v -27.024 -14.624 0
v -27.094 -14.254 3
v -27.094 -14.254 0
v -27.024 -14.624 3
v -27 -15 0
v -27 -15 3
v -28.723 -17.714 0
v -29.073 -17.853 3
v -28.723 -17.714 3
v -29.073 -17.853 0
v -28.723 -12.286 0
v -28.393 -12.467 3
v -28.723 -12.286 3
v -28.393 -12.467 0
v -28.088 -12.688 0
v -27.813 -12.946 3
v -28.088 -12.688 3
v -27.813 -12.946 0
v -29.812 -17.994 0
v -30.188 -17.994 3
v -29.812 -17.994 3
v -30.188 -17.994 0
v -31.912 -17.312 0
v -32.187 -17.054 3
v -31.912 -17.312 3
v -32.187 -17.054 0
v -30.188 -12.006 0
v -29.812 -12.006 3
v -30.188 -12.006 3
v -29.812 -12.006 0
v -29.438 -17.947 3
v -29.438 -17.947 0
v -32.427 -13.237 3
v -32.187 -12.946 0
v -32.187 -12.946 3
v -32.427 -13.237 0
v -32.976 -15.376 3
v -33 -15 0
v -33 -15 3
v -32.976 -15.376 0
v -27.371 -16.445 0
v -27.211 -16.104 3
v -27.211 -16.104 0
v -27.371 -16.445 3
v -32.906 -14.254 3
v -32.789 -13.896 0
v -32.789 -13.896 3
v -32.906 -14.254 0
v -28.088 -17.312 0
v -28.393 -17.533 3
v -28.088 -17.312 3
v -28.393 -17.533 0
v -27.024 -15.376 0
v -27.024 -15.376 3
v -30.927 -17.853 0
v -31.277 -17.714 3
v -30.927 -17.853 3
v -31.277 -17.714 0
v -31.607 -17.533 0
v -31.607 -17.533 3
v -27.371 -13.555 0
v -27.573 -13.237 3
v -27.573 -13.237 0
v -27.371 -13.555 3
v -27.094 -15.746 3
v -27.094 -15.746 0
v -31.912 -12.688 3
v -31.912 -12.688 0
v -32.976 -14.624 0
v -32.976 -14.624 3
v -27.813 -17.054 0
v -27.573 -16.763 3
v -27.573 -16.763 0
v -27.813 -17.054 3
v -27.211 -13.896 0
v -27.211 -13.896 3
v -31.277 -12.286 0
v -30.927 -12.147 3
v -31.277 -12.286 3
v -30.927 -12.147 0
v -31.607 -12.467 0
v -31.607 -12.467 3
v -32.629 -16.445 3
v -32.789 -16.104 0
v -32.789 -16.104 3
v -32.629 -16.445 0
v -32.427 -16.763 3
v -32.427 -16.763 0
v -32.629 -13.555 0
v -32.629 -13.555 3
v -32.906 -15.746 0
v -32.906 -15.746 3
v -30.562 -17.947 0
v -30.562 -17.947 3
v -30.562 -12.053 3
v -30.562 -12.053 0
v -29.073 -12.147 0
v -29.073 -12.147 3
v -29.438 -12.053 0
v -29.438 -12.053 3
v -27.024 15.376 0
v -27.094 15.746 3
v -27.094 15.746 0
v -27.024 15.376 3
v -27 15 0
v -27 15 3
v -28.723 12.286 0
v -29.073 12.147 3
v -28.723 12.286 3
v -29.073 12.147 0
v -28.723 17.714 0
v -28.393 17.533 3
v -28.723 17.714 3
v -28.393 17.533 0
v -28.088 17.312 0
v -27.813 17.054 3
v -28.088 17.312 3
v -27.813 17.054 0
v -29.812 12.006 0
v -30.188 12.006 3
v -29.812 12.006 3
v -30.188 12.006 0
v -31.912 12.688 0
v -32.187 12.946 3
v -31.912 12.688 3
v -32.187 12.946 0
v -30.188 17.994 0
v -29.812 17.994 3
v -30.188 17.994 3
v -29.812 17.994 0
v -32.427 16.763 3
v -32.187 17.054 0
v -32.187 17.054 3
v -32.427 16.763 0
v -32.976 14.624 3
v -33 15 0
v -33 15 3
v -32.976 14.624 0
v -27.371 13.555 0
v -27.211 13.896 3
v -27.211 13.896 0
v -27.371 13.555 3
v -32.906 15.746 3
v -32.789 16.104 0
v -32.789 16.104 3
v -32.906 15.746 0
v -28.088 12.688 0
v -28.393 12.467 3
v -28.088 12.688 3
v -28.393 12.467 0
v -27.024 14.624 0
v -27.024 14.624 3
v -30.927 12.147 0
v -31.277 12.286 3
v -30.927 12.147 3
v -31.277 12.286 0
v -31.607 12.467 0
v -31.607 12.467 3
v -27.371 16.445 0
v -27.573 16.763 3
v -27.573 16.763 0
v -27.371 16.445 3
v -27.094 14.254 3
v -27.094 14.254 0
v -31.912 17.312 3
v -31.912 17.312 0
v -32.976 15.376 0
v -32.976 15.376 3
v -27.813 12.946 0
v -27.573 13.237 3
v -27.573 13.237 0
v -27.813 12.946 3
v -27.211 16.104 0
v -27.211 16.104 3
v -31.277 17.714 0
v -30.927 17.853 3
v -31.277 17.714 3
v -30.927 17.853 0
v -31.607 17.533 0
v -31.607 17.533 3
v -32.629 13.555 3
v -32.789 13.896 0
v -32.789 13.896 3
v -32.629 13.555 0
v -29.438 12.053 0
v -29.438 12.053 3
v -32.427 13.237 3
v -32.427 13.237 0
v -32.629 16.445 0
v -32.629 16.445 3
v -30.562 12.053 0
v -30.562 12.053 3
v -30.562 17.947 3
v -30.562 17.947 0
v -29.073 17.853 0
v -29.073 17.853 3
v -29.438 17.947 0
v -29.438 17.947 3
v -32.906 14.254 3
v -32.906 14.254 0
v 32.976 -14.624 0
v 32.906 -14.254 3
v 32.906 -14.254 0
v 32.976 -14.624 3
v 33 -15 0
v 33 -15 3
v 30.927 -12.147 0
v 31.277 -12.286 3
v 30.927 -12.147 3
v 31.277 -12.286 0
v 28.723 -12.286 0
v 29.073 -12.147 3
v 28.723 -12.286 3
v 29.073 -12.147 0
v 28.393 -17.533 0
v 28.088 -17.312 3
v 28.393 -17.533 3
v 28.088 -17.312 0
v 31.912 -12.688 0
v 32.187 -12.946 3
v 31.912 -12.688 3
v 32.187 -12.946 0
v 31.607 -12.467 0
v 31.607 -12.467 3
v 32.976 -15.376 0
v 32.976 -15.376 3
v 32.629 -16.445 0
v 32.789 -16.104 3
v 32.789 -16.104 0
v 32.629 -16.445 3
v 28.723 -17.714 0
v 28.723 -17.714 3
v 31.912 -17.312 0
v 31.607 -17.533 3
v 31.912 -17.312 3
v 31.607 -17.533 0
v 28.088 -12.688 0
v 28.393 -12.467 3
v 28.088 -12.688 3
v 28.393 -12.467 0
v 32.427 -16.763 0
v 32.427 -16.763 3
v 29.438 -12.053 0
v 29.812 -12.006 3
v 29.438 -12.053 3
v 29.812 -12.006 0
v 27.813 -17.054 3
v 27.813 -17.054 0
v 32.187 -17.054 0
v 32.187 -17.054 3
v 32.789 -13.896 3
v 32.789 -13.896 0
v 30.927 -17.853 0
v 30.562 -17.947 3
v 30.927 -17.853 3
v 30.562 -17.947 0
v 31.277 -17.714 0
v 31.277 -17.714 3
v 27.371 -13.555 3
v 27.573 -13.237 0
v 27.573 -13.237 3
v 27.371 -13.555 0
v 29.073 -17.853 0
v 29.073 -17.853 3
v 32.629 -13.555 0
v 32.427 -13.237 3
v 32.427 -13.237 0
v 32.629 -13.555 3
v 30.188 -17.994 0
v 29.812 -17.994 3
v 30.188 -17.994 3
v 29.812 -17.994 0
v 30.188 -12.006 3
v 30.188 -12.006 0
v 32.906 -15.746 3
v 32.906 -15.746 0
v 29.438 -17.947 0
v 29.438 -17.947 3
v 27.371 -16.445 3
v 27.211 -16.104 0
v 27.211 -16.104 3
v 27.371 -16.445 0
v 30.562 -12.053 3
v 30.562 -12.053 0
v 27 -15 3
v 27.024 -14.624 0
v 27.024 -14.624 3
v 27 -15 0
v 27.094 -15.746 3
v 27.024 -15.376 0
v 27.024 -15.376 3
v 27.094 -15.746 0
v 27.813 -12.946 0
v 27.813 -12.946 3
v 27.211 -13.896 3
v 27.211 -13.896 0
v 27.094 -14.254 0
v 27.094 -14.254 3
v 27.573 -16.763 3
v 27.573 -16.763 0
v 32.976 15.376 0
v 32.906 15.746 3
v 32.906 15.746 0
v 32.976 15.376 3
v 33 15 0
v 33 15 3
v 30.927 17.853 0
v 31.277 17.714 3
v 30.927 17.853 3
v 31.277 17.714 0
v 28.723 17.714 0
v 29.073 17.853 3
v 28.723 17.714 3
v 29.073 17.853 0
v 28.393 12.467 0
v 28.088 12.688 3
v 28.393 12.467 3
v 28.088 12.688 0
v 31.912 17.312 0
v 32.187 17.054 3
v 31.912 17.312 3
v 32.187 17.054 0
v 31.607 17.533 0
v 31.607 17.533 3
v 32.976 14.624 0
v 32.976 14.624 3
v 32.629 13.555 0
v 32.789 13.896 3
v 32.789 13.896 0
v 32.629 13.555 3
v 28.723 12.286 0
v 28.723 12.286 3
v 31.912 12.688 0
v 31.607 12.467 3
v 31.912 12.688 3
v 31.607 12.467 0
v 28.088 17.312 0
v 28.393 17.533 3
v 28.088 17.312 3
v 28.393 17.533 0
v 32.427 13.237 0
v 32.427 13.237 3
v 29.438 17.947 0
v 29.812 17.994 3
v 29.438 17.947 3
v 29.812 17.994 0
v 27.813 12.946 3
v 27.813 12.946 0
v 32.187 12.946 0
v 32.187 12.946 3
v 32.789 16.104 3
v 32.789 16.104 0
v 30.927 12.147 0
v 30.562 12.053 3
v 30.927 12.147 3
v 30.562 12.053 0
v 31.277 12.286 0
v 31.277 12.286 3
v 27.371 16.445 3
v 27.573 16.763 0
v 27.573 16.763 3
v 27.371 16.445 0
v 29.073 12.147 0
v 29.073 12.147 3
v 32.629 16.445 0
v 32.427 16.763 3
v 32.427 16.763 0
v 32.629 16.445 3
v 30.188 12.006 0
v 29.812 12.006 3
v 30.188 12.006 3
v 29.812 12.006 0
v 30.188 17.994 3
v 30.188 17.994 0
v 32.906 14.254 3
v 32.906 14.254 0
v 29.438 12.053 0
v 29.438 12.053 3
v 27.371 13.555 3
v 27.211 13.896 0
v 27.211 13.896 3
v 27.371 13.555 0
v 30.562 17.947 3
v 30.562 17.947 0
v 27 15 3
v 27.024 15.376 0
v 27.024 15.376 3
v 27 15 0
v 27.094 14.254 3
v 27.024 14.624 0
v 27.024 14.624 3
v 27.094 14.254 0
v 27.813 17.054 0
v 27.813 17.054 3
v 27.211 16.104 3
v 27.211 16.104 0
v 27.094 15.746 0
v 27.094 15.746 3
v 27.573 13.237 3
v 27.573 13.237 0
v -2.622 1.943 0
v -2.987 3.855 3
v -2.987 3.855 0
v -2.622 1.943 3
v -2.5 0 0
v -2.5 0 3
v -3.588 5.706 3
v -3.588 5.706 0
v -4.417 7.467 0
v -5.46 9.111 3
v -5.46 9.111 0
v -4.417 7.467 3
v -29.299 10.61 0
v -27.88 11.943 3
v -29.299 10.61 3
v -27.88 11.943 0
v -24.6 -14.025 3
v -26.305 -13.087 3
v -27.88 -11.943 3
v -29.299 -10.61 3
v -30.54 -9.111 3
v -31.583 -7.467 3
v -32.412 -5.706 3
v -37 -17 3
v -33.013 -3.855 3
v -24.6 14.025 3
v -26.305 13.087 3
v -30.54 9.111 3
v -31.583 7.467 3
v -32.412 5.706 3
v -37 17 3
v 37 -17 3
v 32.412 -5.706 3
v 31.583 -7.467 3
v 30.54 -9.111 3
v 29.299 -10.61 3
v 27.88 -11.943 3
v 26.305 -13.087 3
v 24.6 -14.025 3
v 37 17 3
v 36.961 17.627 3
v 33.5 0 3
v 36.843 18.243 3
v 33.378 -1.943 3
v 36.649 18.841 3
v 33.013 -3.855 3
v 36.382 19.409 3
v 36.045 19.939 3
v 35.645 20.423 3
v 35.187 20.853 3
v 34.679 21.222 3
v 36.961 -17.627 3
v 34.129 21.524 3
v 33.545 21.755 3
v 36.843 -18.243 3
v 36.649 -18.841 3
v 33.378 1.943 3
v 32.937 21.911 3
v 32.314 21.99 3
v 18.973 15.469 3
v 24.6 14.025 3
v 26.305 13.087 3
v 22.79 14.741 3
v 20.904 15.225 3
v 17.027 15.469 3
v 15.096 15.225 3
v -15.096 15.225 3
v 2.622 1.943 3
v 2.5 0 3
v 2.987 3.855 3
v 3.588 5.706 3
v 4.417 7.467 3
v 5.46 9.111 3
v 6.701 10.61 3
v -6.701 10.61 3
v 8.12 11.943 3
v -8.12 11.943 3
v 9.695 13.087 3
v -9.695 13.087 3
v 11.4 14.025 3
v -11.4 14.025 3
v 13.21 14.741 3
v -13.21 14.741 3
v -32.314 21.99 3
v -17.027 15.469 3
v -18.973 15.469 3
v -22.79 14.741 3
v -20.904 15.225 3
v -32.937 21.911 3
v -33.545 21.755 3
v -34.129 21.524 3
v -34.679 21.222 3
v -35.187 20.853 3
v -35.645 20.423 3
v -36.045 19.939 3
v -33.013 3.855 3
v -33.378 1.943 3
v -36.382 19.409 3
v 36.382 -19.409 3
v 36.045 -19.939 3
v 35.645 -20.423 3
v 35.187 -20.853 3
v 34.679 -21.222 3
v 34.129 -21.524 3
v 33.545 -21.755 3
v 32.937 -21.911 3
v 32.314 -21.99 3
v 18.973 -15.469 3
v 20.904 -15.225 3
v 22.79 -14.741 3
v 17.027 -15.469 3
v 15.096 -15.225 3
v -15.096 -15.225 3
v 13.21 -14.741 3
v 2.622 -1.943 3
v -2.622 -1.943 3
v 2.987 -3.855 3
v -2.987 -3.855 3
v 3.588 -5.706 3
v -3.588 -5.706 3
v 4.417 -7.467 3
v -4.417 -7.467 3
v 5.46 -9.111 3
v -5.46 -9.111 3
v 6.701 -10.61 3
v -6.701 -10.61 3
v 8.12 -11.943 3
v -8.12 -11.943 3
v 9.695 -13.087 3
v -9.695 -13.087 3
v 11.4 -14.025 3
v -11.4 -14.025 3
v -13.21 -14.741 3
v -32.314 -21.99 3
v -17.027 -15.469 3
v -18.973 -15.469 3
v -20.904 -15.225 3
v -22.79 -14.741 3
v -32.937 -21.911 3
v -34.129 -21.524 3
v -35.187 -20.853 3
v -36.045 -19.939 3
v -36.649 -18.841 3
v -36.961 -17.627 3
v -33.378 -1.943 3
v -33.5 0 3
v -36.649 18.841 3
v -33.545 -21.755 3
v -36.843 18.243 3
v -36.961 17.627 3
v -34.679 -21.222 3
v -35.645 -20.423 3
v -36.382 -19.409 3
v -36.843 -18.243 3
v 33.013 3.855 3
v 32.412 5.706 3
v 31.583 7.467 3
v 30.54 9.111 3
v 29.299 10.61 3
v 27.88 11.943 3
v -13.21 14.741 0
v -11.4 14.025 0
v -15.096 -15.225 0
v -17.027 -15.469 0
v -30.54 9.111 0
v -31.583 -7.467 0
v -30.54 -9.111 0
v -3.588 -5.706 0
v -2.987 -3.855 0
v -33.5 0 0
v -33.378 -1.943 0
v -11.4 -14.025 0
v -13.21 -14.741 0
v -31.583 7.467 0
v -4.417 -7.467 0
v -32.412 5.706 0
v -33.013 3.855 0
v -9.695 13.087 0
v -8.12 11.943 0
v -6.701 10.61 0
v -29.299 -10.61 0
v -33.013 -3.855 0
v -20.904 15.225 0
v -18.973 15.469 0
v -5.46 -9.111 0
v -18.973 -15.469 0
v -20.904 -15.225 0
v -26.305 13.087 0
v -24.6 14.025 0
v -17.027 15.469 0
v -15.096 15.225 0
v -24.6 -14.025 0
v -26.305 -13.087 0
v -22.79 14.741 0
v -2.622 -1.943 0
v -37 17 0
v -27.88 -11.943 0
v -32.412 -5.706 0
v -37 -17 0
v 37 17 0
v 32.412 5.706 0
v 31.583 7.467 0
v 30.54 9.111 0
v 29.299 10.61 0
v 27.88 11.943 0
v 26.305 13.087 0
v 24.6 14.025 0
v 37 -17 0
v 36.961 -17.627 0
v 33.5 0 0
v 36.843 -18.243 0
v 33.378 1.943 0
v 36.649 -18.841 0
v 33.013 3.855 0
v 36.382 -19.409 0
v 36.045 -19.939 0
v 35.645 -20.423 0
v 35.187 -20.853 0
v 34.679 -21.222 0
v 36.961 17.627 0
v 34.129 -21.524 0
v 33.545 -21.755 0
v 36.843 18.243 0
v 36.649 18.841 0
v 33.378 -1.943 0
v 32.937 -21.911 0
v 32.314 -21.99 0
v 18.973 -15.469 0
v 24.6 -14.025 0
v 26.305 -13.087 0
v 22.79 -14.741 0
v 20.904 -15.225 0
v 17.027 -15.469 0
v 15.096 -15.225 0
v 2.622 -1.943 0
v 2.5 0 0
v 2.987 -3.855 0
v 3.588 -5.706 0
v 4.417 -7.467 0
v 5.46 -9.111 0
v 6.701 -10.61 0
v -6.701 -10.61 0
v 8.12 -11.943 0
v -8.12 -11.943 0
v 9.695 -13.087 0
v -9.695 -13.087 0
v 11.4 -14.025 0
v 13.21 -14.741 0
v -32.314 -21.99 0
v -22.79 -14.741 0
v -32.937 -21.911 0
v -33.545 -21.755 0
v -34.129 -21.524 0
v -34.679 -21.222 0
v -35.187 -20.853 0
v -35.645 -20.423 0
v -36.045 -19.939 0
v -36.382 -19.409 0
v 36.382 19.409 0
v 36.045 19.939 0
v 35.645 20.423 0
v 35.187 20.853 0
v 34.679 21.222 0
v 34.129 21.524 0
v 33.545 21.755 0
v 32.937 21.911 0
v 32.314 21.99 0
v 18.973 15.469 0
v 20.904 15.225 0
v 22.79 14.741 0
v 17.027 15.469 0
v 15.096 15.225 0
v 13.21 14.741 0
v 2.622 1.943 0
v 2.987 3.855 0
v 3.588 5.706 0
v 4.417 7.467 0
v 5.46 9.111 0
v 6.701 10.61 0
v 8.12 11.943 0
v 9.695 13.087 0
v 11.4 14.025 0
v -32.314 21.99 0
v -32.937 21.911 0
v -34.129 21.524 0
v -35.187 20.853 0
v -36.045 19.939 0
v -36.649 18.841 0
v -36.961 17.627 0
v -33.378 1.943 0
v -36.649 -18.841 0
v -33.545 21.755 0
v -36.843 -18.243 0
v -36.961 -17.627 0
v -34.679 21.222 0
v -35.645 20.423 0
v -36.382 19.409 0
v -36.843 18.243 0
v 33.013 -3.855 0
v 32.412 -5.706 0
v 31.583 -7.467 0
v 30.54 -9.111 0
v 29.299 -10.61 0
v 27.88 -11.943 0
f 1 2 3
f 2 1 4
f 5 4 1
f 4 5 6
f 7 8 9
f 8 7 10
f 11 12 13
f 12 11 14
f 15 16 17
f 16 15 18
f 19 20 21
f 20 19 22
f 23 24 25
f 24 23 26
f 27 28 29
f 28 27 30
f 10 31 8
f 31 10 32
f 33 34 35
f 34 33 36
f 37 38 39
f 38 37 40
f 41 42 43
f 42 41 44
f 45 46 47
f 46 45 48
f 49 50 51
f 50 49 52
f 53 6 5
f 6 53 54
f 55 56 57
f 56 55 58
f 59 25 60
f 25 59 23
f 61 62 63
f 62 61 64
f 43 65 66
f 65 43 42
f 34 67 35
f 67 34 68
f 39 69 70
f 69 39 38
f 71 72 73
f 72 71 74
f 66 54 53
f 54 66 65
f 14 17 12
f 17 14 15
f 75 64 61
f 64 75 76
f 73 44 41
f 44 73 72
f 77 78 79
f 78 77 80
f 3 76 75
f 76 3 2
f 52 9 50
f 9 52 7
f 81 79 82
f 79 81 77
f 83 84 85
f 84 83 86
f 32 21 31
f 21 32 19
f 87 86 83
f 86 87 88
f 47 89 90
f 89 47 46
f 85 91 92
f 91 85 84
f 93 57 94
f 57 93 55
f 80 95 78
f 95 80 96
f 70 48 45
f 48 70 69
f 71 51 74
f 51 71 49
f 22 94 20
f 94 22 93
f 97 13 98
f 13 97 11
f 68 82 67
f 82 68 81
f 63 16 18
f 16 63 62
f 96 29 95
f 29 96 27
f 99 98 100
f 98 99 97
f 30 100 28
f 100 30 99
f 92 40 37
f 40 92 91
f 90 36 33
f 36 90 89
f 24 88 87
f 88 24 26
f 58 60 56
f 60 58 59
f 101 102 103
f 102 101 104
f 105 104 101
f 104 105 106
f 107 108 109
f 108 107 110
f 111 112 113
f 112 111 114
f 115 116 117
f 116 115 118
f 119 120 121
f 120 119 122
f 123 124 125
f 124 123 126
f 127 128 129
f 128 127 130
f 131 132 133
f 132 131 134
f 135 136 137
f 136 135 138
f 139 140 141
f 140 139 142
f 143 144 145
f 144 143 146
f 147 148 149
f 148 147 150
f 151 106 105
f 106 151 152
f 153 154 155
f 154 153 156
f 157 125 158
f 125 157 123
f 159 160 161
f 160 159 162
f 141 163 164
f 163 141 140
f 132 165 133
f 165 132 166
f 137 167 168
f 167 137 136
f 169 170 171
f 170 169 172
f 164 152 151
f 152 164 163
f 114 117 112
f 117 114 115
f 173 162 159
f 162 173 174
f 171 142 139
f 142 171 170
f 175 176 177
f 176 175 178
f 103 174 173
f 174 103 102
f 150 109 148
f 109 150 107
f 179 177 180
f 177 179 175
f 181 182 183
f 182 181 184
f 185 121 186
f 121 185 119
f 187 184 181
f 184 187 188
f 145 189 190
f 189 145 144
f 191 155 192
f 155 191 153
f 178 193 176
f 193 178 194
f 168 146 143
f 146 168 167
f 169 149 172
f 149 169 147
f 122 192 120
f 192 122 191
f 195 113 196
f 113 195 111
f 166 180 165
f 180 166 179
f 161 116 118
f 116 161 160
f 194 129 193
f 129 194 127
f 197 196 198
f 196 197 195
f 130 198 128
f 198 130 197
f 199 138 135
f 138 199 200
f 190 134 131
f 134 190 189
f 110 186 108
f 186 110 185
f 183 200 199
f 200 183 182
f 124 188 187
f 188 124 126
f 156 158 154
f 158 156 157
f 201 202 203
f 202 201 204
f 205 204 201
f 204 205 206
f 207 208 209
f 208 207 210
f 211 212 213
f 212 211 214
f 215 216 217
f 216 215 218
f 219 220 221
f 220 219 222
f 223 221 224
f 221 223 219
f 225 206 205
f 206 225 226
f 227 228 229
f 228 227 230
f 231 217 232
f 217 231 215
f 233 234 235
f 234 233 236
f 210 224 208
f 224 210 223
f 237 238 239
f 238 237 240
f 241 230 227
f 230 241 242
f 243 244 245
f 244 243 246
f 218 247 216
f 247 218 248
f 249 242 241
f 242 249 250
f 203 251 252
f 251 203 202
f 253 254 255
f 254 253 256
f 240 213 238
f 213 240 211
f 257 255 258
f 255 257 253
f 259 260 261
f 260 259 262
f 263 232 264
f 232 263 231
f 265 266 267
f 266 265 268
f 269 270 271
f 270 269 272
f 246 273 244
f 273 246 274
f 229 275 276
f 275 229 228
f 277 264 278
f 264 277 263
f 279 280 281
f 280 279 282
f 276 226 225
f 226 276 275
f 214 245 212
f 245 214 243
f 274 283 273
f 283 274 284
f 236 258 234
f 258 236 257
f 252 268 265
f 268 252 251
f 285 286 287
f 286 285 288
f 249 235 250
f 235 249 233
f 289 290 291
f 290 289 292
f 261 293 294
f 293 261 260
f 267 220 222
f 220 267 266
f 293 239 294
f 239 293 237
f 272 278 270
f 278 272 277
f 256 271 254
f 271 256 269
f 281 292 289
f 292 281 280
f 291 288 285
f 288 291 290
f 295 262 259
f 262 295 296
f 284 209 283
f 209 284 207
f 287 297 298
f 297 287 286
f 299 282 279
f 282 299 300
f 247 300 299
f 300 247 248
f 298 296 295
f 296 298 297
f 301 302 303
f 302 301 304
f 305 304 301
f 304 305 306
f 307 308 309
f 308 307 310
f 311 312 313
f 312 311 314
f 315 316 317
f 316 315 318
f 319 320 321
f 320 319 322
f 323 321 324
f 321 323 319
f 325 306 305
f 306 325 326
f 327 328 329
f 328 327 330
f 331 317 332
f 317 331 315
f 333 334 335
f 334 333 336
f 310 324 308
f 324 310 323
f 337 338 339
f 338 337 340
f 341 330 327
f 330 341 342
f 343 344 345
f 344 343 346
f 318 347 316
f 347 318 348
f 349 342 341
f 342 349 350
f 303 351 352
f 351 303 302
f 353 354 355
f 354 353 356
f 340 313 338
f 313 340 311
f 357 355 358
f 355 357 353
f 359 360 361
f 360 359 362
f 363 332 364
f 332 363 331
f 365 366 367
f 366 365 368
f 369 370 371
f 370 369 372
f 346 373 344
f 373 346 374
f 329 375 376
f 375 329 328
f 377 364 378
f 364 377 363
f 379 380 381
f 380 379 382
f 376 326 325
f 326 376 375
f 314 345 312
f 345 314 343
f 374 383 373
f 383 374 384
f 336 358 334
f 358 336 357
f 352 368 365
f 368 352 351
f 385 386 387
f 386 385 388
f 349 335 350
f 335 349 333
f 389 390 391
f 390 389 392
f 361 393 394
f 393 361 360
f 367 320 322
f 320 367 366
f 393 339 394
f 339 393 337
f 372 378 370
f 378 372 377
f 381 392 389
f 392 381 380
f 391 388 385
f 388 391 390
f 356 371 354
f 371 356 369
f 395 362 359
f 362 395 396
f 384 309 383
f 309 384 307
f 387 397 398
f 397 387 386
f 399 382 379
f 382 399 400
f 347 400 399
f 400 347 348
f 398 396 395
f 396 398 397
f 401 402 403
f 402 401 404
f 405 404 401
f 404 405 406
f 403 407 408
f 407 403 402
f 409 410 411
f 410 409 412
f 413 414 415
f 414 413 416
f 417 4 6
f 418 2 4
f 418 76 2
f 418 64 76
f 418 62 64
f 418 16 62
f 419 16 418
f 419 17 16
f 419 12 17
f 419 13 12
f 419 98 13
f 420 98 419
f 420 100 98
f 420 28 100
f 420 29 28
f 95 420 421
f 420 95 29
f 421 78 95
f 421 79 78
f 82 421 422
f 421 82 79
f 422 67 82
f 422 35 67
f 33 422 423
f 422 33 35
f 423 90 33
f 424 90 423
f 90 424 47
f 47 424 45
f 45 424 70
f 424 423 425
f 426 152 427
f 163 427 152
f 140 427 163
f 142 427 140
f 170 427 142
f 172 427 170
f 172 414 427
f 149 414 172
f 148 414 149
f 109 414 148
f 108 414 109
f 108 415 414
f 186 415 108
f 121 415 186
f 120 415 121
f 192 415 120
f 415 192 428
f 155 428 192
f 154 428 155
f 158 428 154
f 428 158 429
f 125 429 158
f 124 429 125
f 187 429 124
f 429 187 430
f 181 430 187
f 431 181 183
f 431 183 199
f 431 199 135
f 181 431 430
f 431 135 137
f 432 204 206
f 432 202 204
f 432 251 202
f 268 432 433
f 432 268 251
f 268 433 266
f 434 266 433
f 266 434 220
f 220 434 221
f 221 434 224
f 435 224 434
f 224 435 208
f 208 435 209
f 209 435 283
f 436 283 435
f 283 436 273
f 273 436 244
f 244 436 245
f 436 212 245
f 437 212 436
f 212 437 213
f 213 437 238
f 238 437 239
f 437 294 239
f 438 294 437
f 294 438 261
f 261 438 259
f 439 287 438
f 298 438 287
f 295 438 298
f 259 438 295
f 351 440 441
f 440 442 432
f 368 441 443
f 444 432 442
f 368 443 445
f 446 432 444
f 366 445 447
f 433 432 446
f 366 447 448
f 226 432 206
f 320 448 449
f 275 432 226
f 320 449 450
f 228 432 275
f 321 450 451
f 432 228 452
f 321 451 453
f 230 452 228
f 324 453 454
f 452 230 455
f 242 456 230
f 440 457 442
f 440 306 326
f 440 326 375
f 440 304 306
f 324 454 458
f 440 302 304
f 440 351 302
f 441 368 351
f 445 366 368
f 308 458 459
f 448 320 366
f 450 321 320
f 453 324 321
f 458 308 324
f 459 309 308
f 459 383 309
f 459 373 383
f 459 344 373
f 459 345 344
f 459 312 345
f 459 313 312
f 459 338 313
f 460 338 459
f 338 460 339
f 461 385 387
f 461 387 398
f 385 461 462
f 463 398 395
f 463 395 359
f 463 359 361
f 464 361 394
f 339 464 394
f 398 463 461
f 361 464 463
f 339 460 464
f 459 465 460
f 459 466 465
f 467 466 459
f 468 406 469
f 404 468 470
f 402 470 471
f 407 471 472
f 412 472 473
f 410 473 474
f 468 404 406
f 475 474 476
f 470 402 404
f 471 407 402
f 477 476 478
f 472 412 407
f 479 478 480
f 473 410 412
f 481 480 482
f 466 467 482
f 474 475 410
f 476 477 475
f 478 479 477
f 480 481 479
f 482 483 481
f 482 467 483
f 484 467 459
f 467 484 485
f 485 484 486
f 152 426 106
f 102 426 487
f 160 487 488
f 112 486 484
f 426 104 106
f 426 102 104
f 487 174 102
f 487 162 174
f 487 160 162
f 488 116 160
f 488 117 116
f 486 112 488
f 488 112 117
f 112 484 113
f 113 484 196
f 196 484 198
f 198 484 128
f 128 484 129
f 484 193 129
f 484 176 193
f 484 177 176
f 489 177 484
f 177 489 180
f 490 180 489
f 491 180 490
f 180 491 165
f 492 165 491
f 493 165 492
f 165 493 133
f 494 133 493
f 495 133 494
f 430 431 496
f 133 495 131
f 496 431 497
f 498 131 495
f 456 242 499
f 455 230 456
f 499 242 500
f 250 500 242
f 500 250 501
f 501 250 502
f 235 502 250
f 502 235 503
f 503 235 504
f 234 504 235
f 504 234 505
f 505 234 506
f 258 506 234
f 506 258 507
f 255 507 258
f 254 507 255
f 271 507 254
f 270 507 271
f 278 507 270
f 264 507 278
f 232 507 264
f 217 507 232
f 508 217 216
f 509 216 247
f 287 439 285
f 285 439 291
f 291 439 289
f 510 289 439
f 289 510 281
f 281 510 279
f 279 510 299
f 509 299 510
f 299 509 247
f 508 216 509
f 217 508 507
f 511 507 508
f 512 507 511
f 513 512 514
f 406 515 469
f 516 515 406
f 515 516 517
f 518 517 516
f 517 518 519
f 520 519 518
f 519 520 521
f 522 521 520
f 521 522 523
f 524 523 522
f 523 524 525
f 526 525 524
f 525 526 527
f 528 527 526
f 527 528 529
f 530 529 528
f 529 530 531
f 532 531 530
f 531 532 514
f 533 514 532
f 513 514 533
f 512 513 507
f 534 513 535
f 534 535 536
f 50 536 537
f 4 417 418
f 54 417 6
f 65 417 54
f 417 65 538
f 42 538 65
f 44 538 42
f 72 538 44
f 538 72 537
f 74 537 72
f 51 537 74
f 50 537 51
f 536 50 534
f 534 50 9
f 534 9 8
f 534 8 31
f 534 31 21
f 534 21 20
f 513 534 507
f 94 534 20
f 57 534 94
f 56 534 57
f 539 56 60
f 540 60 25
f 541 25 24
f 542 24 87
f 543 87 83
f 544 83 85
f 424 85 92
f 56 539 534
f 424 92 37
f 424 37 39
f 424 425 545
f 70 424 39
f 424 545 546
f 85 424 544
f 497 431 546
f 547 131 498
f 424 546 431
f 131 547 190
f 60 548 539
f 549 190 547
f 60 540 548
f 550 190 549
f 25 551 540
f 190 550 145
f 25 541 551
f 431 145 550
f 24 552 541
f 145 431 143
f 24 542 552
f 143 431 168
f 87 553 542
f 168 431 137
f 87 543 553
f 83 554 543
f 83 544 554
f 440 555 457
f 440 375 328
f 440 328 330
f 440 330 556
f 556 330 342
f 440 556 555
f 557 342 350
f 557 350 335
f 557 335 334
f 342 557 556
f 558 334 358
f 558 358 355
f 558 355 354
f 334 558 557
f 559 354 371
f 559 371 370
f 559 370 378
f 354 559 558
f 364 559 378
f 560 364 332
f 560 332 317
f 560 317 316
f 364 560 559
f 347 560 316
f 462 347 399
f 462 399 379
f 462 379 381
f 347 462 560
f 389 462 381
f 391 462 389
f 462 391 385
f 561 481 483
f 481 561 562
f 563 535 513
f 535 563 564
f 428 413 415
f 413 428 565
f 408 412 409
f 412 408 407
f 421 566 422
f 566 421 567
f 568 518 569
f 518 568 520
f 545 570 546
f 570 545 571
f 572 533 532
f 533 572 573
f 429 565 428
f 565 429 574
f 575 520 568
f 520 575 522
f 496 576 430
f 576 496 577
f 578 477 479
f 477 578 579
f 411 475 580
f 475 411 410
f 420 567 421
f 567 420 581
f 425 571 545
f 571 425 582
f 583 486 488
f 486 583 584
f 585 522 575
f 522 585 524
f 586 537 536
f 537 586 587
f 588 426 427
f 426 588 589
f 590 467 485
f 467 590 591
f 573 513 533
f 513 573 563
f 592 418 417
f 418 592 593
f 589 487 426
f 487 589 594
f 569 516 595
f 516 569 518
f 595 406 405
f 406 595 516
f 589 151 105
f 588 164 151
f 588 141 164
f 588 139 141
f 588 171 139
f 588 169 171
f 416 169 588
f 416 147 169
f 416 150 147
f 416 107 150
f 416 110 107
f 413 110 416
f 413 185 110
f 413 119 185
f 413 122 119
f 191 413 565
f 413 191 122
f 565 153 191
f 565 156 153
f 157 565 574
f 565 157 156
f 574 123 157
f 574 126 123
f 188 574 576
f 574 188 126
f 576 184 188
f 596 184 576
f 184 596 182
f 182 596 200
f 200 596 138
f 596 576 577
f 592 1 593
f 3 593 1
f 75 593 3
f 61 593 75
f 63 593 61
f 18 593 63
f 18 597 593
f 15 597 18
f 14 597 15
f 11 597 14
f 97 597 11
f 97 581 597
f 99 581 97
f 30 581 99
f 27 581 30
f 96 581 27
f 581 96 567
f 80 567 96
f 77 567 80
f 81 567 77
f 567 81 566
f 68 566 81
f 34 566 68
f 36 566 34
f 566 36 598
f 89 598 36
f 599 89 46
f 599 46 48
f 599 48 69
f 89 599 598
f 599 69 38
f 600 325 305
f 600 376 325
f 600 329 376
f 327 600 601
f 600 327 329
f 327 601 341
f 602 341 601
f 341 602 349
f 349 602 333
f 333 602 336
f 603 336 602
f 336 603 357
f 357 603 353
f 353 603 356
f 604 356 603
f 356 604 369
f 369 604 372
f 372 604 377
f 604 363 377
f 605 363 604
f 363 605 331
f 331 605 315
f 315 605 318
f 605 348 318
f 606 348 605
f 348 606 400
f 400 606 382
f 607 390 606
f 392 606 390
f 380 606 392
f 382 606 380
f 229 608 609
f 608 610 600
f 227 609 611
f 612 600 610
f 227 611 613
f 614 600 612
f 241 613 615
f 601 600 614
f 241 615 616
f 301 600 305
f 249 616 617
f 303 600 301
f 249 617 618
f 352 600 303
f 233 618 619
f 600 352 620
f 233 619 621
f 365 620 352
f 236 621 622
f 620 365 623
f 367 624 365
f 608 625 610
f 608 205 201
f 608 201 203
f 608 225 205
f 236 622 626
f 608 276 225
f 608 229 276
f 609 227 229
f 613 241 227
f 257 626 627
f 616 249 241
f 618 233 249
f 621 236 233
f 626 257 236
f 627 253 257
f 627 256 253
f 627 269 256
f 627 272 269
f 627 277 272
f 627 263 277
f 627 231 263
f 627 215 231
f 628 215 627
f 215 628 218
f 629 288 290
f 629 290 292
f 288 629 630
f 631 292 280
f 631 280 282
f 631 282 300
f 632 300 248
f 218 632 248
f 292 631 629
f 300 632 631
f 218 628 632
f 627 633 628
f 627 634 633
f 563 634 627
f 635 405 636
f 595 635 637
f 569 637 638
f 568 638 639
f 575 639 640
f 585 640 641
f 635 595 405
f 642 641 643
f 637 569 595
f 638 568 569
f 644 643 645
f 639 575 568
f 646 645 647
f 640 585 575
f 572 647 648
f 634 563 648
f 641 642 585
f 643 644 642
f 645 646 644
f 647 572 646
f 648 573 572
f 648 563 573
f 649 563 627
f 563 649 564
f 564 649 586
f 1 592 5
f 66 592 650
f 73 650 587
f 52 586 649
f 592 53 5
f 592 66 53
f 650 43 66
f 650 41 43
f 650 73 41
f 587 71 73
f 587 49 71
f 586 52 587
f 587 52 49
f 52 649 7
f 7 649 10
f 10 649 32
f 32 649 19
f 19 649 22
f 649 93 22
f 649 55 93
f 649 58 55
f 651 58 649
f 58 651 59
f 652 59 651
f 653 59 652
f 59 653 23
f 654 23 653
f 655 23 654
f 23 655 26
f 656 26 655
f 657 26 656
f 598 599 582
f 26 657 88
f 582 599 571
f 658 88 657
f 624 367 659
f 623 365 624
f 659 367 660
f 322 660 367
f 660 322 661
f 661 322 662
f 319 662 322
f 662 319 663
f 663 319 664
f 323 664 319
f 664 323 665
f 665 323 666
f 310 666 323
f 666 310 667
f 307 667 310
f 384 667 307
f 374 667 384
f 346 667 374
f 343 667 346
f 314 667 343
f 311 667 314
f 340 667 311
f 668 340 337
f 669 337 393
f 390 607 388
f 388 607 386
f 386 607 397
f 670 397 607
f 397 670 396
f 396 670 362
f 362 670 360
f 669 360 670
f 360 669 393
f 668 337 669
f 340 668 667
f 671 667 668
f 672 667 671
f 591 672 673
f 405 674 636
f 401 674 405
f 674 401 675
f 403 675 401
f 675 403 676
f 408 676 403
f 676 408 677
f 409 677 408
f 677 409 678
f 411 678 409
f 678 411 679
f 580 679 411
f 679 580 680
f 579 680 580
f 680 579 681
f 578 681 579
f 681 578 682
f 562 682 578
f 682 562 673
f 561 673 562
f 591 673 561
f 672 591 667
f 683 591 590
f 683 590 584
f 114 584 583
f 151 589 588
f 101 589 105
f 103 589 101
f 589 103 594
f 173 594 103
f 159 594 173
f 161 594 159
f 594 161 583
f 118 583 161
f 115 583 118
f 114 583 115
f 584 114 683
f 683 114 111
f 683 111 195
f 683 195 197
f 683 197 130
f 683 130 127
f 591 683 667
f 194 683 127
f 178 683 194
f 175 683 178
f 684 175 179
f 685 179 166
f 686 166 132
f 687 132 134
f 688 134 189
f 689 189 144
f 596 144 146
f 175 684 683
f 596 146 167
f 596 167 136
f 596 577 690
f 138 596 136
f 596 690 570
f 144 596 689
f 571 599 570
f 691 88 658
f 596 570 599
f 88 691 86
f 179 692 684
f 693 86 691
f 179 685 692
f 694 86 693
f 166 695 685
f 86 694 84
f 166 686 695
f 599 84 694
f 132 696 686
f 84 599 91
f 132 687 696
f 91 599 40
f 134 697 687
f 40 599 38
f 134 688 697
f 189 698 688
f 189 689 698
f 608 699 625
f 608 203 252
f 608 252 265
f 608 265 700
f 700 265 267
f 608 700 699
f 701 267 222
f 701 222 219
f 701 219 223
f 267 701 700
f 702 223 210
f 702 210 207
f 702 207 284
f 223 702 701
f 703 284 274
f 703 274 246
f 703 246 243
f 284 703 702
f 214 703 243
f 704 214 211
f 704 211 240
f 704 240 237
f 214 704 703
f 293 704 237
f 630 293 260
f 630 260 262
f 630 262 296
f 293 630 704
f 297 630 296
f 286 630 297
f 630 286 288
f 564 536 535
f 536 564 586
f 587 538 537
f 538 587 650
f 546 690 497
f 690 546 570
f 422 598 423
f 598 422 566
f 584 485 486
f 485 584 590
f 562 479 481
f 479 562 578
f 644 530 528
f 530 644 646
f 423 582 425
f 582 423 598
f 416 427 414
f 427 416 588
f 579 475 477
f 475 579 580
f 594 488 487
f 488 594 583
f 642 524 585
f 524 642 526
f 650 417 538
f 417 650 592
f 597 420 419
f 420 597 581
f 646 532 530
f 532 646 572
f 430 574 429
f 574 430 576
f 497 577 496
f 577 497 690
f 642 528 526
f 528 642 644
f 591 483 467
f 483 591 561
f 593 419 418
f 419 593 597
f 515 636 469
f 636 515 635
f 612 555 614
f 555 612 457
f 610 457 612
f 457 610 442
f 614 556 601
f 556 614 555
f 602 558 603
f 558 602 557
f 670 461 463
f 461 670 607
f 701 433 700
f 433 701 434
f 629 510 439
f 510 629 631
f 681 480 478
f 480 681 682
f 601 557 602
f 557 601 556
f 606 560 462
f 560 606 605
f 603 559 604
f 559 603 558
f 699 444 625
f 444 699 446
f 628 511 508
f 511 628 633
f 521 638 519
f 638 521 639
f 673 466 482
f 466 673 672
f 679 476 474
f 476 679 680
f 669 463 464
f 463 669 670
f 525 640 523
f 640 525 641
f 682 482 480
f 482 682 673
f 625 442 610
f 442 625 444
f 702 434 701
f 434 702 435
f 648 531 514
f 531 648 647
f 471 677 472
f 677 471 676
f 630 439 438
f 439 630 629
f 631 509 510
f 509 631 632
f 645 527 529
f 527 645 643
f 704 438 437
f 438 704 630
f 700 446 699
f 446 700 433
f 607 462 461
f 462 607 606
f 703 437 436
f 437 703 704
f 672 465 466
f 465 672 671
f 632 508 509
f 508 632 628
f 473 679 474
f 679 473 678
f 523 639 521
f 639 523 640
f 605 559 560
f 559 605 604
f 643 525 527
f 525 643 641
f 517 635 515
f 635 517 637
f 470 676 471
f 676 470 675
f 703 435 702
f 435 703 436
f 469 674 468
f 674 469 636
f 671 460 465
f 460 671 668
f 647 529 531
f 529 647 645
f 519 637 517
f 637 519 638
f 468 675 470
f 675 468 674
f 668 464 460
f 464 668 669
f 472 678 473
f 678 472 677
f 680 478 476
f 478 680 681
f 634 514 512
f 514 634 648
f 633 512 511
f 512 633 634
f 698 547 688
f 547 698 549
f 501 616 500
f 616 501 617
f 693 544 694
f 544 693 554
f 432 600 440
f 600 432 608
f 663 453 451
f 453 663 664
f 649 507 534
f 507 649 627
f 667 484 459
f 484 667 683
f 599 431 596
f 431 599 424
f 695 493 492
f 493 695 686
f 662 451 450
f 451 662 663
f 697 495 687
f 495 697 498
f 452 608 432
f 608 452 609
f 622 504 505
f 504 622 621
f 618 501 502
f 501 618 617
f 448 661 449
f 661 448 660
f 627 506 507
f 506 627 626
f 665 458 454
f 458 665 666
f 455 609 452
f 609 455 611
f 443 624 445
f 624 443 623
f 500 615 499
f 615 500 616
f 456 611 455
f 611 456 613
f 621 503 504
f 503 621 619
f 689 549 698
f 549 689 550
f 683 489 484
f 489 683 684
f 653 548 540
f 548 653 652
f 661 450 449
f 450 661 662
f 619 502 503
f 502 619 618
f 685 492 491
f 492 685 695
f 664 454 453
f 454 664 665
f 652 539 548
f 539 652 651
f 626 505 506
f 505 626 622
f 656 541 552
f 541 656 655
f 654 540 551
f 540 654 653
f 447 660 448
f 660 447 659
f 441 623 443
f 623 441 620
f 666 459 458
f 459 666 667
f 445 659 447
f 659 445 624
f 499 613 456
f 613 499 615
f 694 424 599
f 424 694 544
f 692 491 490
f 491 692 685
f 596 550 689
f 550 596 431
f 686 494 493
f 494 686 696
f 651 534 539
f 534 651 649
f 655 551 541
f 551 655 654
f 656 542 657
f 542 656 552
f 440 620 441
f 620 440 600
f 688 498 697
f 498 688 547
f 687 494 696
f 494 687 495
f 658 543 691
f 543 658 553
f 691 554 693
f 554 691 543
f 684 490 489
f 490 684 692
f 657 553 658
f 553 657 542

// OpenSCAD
$fn = 50;


difference() {
	union() {
		hull() {
			translate(v = [-32.0000000000, 17.0000000000, 0]) {
				cylinder(h = 3, r = 5);
			}
			translate(v = [32.0000000000, 17.0000000000, 0]) {
				cylinder(h = 3, r = 5);
			}
			translate(v = [-32.0000000000, -17.0000000000, 0]) {
				cylinder(h = 3, r = 5);
			}
			translate(v = [32.0000000000, -17.0000000000, 0]) {
				cylinder(h = 3, r = 5);
			}
		}
	}
	union() {
		#translate(v = [-30.0000000000, -15.0000000000, -100.0000000000]) {
			cylinder(h = 200, r = 3.0000000000);
		}
		#translate(v = [-30.0000000000, 15.0000000000, -100.0000000000]) {
			cylinder(h = 200, r = 3.0000000000);
		}
		#translate(v = [30.0000000000, -15.0000000000, -100.0000000000]) {
			cylinder(h = 200, r = 3.0000000000);
		}
		#translate(v = [30.0000000000, 15.0000000000, -100.0000000000]) {
			cylinder(h = 200, r = 3.0000000000);
		}
		#translate(v = [-18.0000000000, 0, 0]) {
			cylinder(h = 3, r = 15.5000000000);
		}
		#translate(v = [18.0000000000, 0, 0]) {
			cylinder(h = 3, r = 15.5000000000);
		}
	}
}
